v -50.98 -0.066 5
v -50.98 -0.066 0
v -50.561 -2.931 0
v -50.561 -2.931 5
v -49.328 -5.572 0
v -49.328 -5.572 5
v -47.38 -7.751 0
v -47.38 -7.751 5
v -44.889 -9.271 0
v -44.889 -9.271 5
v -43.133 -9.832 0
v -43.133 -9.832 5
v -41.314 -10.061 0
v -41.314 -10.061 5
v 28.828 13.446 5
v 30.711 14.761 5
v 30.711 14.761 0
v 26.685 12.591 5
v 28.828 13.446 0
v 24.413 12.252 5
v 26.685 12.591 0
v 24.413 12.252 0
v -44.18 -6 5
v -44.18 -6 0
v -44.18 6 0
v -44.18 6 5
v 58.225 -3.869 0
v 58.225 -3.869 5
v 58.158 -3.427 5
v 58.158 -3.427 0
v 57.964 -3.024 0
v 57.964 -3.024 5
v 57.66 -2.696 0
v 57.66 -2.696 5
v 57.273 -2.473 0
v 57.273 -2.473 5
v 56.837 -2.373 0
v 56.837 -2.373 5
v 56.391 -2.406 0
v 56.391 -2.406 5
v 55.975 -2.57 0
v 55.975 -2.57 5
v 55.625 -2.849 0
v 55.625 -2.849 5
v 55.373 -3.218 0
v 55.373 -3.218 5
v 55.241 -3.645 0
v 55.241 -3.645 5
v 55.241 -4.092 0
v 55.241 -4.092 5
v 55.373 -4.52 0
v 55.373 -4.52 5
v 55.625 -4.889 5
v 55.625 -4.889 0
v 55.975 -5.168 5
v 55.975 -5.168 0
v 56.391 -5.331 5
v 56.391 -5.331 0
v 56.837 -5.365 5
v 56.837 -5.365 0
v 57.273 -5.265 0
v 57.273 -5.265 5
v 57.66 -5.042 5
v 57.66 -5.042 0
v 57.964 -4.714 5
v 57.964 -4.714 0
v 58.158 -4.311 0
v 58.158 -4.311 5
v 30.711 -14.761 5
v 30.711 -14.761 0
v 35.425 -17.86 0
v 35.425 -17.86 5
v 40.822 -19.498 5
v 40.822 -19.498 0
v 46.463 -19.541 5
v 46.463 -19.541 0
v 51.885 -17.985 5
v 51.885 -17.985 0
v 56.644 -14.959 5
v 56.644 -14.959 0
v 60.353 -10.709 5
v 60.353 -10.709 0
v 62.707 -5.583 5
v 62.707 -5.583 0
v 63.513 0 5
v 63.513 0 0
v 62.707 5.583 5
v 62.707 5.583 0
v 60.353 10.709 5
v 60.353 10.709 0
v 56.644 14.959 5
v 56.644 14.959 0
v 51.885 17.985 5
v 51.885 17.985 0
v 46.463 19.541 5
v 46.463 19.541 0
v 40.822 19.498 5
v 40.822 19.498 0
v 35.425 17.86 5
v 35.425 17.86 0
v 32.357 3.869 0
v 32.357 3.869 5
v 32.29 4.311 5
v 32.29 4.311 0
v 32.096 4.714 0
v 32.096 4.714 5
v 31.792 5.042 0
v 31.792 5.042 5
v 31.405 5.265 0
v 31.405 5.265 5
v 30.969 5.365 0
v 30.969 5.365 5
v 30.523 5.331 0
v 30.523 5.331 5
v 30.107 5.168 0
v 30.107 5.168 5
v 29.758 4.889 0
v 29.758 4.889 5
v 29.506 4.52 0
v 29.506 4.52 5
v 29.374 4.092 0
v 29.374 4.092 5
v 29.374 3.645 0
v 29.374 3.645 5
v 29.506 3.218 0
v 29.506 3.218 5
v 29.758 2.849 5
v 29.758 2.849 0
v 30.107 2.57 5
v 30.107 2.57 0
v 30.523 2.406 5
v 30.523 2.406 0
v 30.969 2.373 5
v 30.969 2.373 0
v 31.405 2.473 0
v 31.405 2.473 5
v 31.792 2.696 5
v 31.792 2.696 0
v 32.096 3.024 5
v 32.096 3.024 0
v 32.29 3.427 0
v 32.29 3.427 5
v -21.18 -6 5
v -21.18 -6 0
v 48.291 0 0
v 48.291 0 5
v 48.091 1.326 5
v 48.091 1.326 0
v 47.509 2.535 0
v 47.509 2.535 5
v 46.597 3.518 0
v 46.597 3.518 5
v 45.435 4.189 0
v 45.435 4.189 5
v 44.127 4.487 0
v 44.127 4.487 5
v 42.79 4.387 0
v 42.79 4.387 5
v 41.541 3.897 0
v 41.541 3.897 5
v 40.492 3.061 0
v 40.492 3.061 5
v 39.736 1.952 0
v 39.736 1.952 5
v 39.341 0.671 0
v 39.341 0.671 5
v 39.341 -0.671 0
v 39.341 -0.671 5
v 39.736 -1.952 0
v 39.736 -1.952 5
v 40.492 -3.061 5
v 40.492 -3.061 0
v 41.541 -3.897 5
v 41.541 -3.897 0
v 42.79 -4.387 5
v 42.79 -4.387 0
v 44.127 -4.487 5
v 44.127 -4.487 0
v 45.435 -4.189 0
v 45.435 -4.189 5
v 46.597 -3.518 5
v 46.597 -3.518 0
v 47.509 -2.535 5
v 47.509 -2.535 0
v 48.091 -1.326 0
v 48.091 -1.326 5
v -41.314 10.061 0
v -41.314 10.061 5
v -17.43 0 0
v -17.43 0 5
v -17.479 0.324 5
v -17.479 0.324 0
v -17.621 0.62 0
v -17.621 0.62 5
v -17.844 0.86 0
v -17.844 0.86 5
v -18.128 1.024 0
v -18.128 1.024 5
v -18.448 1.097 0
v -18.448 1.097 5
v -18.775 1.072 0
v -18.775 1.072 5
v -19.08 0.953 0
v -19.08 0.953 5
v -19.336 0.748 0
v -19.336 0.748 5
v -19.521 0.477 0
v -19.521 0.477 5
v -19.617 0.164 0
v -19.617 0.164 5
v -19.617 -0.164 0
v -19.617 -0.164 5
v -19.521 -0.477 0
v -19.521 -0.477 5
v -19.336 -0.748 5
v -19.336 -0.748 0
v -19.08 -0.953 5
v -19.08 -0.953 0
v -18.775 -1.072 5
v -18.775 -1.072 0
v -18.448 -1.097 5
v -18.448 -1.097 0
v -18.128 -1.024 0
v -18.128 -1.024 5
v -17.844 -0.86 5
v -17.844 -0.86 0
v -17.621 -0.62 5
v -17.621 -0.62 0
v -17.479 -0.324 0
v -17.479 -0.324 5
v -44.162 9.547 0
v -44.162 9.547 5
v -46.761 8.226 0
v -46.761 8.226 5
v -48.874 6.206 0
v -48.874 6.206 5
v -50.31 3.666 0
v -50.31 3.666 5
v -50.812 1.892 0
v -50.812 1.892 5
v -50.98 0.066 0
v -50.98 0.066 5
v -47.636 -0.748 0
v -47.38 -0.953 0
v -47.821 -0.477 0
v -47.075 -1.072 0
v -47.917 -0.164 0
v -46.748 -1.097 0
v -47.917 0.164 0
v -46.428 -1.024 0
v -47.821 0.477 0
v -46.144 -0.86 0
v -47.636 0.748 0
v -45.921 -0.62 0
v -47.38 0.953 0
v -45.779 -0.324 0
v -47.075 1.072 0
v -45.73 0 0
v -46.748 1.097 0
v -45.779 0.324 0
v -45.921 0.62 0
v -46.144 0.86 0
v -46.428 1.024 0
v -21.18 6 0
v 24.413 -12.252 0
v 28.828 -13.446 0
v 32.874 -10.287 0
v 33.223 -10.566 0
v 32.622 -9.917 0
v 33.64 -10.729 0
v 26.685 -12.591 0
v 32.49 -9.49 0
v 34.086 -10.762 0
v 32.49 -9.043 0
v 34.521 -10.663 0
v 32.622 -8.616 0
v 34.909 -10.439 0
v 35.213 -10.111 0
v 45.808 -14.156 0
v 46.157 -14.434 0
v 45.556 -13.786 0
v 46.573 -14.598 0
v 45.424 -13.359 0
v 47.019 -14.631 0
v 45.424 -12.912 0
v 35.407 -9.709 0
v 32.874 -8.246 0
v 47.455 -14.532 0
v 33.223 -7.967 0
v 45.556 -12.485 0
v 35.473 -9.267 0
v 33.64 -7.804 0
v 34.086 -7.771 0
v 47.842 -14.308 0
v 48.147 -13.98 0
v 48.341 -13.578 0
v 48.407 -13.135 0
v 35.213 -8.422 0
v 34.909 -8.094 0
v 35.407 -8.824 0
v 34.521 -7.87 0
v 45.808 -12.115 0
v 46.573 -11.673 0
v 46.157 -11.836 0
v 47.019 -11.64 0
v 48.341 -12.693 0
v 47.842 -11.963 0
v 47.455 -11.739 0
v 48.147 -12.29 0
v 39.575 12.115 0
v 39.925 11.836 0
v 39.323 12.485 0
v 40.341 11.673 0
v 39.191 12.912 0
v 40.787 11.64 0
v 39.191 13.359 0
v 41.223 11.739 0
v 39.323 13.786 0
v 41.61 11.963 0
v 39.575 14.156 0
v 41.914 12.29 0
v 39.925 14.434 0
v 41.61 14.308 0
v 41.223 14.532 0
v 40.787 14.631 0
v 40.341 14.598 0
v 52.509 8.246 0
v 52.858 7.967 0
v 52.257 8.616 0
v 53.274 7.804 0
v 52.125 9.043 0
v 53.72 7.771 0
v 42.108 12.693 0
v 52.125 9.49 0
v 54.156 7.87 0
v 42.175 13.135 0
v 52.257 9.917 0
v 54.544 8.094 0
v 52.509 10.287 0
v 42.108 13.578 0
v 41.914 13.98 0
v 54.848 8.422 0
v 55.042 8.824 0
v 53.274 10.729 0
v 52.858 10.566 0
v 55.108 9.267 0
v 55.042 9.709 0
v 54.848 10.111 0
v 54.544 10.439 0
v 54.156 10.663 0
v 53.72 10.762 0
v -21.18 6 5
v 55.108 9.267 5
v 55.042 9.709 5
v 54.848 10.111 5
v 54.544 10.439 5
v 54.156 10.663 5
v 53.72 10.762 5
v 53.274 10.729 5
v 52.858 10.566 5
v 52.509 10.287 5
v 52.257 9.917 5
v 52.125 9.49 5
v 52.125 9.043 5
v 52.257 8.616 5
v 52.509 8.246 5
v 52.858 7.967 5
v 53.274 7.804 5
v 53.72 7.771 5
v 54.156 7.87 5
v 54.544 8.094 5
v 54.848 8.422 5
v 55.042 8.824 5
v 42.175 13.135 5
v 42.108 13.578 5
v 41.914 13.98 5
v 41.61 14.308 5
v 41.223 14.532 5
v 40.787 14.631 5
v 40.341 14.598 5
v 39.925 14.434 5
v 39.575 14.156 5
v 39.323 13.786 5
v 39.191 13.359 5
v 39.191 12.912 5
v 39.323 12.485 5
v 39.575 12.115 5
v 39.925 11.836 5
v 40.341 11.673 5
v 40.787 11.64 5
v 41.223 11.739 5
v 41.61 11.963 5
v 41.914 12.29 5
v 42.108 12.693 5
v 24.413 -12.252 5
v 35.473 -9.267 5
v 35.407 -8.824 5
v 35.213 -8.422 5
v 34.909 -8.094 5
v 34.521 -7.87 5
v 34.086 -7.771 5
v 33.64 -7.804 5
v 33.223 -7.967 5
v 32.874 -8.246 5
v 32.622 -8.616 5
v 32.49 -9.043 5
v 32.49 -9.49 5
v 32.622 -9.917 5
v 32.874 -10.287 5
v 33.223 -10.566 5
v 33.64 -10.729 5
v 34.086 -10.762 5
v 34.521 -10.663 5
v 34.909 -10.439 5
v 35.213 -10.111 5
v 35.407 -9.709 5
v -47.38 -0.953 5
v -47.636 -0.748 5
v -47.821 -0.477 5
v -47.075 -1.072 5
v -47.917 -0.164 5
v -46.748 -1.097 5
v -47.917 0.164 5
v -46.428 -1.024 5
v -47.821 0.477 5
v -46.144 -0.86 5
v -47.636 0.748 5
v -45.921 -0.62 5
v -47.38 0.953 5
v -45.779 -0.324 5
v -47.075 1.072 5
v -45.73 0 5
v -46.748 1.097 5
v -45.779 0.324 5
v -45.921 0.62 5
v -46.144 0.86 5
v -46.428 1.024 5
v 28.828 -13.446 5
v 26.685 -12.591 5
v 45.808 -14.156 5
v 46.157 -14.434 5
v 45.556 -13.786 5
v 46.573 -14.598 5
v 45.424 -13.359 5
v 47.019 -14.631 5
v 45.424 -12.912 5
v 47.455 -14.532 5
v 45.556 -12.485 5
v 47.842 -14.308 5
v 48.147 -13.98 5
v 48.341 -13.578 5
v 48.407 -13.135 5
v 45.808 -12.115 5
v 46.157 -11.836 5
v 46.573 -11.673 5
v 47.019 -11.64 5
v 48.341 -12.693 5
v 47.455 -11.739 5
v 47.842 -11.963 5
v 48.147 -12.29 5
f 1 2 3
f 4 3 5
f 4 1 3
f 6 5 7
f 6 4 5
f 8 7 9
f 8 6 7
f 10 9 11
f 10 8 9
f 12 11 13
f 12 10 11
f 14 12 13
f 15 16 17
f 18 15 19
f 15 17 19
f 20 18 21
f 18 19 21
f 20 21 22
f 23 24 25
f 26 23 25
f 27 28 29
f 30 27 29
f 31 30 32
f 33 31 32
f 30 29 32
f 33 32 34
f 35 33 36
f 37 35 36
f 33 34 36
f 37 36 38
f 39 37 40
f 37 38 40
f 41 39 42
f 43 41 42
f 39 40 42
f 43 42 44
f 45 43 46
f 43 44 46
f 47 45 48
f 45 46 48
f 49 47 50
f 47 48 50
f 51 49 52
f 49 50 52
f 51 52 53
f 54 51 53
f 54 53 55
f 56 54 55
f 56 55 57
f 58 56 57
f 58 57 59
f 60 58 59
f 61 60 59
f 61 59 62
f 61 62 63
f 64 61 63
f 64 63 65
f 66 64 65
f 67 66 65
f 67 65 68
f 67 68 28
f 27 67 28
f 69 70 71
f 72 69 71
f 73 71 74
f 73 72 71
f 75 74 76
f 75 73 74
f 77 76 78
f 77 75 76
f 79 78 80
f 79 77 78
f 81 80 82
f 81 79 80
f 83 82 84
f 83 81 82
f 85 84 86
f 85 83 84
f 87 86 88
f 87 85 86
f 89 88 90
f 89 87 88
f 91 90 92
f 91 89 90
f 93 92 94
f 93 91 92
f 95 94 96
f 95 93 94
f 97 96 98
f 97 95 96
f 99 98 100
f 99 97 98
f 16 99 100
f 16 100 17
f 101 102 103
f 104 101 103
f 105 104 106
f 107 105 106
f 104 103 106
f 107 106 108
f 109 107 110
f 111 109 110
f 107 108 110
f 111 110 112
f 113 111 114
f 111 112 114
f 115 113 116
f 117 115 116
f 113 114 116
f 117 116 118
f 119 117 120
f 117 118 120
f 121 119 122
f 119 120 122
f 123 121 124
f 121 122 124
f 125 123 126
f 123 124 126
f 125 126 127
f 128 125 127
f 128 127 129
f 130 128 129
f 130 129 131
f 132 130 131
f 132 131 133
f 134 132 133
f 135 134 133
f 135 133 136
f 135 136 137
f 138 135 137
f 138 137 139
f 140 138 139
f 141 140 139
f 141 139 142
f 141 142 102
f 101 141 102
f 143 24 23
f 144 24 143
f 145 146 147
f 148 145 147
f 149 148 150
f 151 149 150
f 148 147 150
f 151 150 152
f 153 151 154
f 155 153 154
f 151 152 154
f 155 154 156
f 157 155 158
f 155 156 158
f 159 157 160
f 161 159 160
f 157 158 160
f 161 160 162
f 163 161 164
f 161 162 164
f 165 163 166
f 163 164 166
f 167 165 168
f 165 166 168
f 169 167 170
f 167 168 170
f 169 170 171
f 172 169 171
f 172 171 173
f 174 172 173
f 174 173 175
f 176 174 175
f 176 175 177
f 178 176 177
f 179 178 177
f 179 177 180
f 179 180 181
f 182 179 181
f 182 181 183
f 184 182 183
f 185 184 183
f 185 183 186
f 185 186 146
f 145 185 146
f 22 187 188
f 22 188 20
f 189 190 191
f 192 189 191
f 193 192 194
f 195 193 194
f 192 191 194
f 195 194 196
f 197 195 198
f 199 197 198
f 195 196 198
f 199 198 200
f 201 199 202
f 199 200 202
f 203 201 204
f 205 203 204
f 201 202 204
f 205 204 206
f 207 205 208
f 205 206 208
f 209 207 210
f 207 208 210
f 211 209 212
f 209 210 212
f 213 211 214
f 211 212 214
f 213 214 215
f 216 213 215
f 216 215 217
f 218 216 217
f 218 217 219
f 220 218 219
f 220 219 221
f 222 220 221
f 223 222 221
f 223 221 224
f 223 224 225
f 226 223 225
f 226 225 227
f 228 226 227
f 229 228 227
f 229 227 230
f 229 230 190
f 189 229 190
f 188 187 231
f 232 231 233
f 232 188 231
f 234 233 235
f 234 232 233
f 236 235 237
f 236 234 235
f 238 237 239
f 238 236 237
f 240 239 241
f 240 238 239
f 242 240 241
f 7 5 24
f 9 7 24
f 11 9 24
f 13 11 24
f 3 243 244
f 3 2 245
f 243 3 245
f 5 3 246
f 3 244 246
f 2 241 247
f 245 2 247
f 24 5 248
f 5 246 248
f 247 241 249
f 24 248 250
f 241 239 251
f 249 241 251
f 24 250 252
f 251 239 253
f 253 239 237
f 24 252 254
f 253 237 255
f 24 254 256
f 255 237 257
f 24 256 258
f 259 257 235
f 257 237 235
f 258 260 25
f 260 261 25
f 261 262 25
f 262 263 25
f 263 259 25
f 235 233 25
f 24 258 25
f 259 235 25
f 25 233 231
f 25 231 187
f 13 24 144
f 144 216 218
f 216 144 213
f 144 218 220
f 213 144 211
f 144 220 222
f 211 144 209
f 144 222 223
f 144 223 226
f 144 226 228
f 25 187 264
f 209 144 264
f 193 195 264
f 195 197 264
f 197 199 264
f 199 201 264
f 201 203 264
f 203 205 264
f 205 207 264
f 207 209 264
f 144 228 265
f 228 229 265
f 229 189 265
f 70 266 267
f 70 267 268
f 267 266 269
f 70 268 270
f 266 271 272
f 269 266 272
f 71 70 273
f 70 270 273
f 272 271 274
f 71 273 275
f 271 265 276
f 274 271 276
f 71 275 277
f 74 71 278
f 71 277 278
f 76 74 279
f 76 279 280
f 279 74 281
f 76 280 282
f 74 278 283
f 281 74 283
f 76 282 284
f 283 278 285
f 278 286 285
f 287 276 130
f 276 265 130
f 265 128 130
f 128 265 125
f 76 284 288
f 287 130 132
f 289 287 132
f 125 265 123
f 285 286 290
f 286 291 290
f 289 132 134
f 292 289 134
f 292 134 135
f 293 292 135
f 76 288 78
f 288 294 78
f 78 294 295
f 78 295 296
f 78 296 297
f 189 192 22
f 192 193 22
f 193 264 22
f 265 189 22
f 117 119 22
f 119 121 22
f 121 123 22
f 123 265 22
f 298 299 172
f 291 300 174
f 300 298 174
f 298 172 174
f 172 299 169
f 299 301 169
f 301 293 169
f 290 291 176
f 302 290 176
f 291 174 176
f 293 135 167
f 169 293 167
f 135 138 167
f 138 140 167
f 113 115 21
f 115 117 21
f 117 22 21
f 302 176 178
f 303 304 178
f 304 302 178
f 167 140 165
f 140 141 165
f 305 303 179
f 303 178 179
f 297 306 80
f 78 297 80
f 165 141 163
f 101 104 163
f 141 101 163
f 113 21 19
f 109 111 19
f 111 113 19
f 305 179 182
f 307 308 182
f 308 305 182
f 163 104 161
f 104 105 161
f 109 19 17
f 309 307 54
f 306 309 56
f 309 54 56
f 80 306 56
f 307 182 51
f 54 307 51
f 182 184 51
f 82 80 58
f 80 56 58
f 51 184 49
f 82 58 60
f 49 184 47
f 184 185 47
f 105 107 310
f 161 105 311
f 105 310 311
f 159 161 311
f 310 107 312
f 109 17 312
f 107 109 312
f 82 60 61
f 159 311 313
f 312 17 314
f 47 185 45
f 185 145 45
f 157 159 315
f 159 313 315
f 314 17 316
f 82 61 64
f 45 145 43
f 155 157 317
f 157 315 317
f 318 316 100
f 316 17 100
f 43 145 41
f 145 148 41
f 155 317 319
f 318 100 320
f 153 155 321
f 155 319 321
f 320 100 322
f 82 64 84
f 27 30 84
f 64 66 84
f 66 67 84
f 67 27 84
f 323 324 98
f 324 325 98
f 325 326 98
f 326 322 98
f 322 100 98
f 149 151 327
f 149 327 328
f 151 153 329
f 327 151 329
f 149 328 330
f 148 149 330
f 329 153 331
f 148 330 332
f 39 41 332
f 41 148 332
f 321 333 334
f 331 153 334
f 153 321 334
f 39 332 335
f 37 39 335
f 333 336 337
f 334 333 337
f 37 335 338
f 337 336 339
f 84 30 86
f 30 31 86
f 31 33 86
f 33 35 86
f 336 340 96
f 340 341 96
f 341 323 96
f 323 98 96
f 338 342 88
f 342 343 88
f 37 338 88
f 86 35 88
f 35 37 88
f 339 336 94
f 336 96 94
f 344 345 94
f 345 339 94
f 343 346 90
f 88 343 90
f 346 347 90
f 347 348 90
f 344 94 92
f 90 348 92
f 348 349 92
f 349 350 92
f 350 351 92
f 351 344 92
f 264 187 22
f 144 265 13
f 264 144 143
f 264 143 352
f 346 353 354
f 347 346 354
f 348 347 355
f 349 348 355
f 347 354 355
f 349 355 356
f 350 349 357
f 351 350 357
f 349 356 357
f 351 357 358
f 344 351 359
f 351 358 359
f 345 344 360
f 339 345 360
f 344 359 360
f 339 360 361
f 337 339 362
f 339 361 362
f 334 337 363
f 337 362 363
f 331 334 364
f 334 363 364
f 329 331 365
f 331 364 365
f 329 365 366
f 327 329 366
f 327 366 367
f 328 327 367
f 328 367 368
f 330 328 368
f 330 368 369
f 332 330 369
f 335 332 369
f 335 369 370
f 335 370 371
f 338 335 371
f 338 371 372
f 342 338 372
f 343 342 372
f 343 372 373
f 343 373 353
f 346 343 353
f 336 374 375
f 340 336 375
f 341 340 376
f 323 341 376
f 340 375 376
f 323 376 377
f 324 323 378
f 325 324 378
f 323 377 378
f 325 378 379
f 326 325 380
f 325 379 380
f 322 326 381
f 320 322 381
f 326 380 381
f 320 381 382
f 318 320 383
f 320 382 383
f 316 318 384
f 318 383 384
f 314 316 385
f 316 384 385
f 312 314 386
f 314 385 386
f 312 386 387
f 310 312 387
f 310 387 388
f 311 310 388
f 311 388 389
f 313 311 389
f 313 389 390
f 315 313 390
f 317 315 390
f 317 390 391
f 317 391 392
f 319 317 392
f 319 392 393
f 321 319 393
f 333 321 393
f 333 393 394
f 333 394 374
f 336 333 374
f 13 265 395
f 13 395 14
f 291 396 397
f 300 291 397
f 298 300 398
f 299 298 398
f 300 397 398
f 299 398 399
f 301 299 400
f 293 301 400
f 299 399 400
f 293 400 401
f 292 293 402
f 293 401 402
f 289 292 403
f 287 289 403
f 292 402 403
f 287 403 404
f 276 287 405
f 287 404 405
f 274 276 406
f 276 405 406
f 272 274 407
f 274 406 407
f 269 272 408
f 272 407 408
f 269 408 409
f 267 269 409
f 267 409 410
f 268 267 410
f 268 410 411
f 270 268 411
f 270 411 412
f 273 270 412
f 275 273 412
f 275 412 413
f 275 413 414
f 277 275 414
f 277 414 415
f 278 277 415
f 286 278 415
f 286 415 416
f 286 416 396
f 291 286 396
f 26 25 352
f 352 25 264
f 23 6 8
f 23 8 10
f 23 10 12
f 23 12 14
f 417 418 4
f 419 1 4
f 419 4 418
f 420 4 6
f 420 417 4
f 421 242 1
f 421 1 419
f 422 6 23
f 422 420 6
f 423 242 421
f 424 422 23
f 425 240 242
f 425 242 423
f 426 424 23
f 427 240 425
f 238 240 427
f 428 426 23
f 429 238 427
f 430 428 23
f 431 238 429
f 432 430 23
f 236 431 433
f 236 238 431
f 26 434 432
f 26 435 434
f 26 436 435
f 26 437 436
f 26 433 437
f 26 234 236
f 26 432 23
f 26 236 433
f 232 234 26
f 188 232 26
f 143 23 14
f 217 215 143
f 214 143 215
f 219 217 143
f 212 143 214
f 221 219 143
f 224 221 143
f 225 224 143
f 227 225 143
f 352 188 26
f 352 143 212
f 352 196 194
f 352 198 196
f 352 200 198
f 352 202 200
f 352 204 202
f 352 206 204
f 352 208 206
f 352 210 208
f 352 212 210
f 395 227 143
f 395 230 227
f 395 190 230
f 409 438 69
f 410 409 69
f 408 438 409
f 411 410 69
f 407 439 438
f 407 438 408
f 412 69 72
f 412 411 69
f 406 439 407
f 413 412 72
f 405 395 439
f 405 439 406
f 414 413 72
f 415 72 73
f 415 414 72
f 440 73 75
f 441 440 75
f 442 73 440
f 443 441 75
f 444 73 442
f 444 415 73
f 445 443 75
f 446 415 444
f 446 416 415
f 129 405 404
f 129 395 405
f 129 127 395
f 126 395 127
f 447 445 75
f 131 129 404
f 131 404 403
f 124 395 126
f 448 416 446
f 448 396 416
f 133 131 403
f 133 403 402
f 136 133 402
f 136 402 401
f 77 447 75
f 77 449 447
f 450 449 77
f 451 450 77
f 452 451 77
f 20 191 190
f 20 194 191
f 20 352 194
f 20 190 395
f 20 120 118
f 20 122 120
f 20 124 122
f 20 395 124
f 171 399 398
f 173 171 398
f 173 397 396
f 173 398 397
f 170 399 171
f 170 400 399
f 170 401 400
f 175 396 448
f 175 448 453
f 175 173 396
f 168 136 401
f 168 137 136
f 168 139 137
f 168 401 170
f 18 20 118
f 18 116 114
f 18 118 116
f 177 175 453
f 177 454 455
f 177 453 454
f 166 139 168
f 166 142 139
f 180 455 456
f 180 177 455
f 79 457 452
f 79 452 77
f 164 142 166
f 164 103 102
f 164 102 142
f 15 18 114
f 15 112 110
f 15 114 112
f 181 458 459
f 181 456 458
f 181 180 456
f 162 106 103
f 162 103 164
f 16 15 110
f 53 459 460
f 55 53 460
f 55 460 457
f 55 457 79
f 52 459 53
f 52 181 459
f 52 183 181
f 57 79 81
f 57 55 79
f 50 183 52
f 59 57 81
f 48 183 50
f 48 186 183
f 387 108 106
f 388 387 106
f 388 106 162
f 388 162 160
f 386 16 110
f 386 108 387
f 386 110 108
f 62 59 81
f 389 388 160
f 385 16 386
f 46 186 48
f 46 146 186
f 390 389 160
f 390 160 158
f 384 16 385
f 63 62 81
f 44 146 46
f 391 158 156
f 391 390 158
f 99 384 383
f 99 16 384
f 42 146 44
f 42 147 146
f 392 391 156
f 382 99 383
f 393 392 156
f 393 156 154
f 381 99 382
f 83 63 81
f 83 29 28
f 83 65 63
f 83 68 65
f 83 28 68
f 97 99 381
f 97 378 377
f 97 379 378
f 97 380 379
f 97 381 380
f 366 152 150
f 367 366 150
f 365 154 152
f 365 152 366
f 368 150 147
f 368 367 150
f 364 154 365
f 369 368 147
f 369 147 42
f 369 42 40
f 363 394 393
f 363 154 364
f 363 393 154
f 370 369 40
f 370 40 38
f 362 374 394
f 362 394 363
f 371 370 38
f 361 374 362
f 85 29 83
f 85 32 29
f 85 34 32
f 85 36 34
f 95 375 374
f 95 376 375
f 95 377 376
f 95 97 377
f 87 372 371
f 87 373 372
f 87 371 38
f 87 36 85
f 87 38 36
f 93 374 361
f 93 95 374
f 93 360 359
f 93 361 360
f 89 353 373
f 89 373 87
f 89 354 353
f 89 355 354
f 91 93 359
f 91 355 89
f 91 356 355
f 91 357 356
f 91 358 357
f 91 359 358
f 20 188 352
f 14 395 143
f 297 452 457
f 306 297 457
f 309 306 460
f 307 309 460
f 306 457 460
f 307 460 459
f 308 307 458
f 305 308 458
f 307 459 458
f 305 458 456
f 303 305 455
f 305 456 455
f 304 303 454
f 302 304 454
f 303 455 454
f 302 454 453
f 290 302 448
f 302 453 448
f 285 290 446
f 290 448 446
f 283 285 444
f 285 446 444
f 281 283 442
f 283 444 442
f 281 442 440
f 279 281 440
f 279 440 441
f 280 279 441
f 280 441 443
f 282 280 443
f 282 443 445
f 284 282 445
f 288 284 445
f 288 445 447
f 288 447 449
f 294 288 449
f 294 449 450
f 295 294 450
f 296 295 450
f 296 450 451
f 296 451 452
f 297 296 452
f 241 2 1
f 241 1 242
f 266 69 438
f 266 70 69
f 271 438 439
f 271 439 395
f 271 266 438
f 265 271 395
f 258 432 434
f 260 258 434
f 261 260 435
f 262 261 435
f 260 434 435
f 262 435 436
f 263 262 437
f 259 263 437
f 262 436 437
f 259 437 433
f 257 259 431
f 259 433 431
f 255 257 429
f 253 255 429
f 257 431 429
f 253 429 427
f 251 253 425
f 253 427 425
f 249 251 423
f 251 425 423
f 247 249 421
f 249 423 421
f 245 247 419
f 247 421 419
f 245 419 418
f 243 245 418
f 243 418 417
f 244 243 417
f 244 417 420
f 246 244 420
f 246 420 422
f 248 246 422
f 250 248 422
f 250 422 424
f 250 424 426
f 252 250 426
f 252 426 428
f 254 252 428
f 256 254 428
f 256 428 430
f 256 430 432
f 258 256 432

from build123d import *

# Parameters (mm, degrees)
SKETCH1_R           = 1.960784314
SKETCH1_W           = 23
SKETCH1_H           = 12
BOSS_EXTRUDE1_DEPTH = 5
FILLET2_R           = 20
SKETCH3_R           = 19.722379498
SKETCH3_R_2         = 3
BOSS_EXTRUDE2_DEPTH = 5
FILLET3_R           = 10
SKETCH6_R           = 4.5
CUT_EXTRUDE3_DEPTH  = 6
SKETCH7_R           = 1.5
SKETCH7_R_2         = 4.5
CUT_EXTRUDE4_DEPTH  = 10
SKETCH9_R           = 1.1
CUT_EXTRUDE6_DEPTH  = 10


with BuildPart() as part:
    # Sketch1 → Boss-Extrude1 (new body)
    with BuildSketch(Plane.XY):
        Polygon((49.019607843, 13.071895425), (49.019607843, -13.071895425), (-49.019607843, -9.803921569), (-50.980392157, -9.803921569), (-50.980392157, 9.803921569), (-49.019607843, 9.803921569), align=None)
        with Locations((43.790849673, 0)):
            Circle(SKETCH1_R, mode=Mode.SUBTRACT)
        with Locations((-32.679738562, 0)):
            Rectangle(SKETCH1_W, SKETCH1_H, mode=Mode.SUBTRACT)
    extrude(amount=BOSS_EXTRUDE1_DEPTH)

    # Fillet2
    # the kernel refuses this fillet: 20 mm, written as the material it takes off along each edge
    with BuildSketch(Plane(origin=(49.019607843, -13.071895425, -51.694436733), x_dir=(0, 1, 0), z_dir=(0, 0, 1))) as fillet2_piece_1:
        with BuildLine():
            CenterArc((FILLET2_R * 1.03388873465, FILLET2_R), FILLET2_R, 178.090847567, 91.909152433)
            Line((FILLET2_R * 0.0344438276744, FILLET2_R * 1.03331483023), (0, 0))
            Line((0, 0), (FILLET2_R * 1.03388873465, 0))
        make_face()
    extrude(amount=108.388873465, mode=Mode.SUBTRACT)
    with BuildSketch(Plane(origin=(49.019607843, 13.071895425, -51.694436733), x_dir=(0, -1, 0), z_dir=(0, 0, 1))) as fillet2_piece_2:
        with BuildLine():
            CenterArc((FILLET2_R * 1.03388873465, -FILLET2_R), FILLET2_R, 90, 91.909152433)
            Line((FILLET2_R * 0.0344438276744, -FILLET2_R * 1.03331483023), (0, 0))
            Line((0, 0), (FILLET2_R * 1.03388873465, 0))
        make_face()
    extrude(amount=108.388873465, mode=Mode.SUBTRACT)

    # Sketch3 → Boss-Extrude2 (add)
    with BuildSketch(Plane.XY.offset(5)):
        with Locations((43.790849673, 0)):
            Circle(SKETCH3_R)
        with Locations((43.790849673, 0)):
            Circle(SKETCH3_R_2, mode=Mode.SUBTRACT)
    extrude(amount=-BOSS_EXTRUDE2_DEPTH)

    # Fillet3
    fillet3_edges = [part.edges().sort_by_distance(p)[0] for p in [
        (-50.980392157, 9.803921569, 2.5),
        (-50.980392157, -9.803921569, 2.5),
        (28.442748303, -12.385799828, 2.5),
        (28.442748303, 12.385799828, 2.5),
    ]]
    fillet(fillet3_edges, radius=FILLET3_R)

    # Sketch6 → Cut-Extrude3 (cut)
    with BuildSketch(Plane.XY.offset(5)):
        with Locations((43.790849673, 0)):
            Circle(SKETCH6_R)
    extrude(amount=-CUT_EXTRUDE3_DEPTH, mode=Mode.SUBTRACT)

    # Sketch7 → Cut-Extrude4 (cut)
    with BuildSketch(Plane.XY.offset(5)):
        with Locations((53.608271623, 9.266511008)):
            Circle(SKETCH7_R)
        with Locations((43.790849673, 0)):
            Circle(SKETCH7_R_2)
        with Locations((56.724594586, -3.868881304)):
            Circle(SKETCH7_R)
        with Locations((46.907172636, -13.135392312)):
            Circle(SKETCH7_R)
        with Locations((33.973427724, -9.266511008)):
            Circle(SKETCH7_R)
        with Locations((30.857104761, 3.868881304)):
            Circle(SKETCH7_R)
        with Locations((40.67452671, 13.135392312)):
            Circle(SKETCH7_R)
    extrude(amount=-CUT_EXTRUDE4_DEPTH, mode=Mode.SUBTRACT)

    # Sketch9 → Cut-Extrude6 (cut)
    with BuildSketch(Plane.XY.offset(5)):
        with Locations((-46.829738562, 0)):
            Circle(SKETCH9_R)
        with Locations((-18.529738562, 0)):
            Circle(SKETCH9_R)
    extrude(amount=-CUT_EXTRUDE6_DEPTH, mode=Mode.SUBTRACT)


solid = part.part
